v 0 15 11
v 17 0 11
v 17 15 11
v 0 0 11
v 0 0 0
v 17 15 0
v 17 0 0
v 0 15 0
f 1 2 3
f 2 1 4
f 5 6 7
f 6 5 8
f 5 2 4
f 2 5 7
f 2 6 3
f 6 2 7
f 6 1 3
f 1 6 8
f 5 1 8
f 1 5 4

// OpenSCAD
// Generated by SolidPython 1.0.1 on 2020-07-29 00:46:56


cube(size = [17, 15, 11]);
/***********************************************
*********      SolidPython code:      **********
************************************************
 
# import packages: SolidPython
from solid import *
from solid.utils import *
from itertools import chain, combinations, permutations


class Resize:

    def __init__(self, scad_file):
        self.scad_file = scad_file
        #self.scad_file = import_scad(scad_file)
        # cone/cylinder param:
        self.r1 = 0
        self.r2 = 0
        self.h = 0
        # rectangular prism param:
        self.w = 0
        self.l = 0
        # ellipse param:
        self.r = 0

    # import OpenScad code (file name corresponds to shape)


    # classify shape + parameters
    def assign(self, param1, param2, param3):
        if self.scad_file == 'cone.scad':
            self.r1 = param1
            self.r2 = param2
            self.h = param3
        elif self.scad_file == 'cylinder.scad':
            self.r1 = param1
            self.r2 = param2
            self.h = param3
        elif self.scad_file == 'rectangularPrism.scad':
            self.h = param1
            self.l = param2
            self.w = param3
        else:
            self.r = param1
            self.h = param2

    # resize parameters
    def iterate(self):
        x = range(3, 20, 2)
        i = 1
        if self.scad_file == 'cone.scad':
            tempList = list(permutations(x, 2))
            for temp in tempList:
                param1 = temp[0]
                param2 = temp[1]
                filepath = 'produced_scad_files/' + 'cone' + str(param1) + '_' + str(param2) + '_' + '.scad'
                scad_render_to_file(cylinder(h=param1, r1=param2, r2=0), filepath)

        elif self.scad_file == 'cylinder.scad':
            tempList = list(permutations(x, 3))
            for temp in tempList:
                param1 = temp[0]
                param2 = temp[1]
                filepath = 'produced_scad_files/' + 'cylinder' + str(param1) + '_' + str(param2) + '_' + '.scad'
                scad_render_to_file(cylinder(h=param1, r1=param2, r2=param2), filepath)

        elif self.scad_file == 'rectangularPrism.scad':
            tempList = list(permutations(x, 3))
            for temp in tempList:
                param1 = temp[0]
                param2 = temp[1]
                param3 = temp[2]
                filepath = 'produced_scad_files/' + 'rectangularPrism' + str(param1) + '_' + str(param2) + '_' + str(
                    param3) + '.scad'
                scad_render_to_file(cube(size=(param1, param2, param3)), filepath)

        elif self.scad_file == 'ellipse.scad':
            tempList = list(permutations(x, 4))
            for temp in tempList:
                param1 = temp[0]
                param2 = temp[1]
                param3 = temp[2]
                param4 = temp[3]
                filepath = 'produced_scad_files/' + 'ellipse' + str(param1) + '_' + str(param2) + '_' + str(param3) + '_' + str(param4) + '.scad'
                scad_render_to_file(scale([param1, param2, param3])(sphere(r=param4)), filepath)

    def render_to_scadfile(self):
        scad_render_to_file(scad, 'example.scad') 
 
************************************************/
